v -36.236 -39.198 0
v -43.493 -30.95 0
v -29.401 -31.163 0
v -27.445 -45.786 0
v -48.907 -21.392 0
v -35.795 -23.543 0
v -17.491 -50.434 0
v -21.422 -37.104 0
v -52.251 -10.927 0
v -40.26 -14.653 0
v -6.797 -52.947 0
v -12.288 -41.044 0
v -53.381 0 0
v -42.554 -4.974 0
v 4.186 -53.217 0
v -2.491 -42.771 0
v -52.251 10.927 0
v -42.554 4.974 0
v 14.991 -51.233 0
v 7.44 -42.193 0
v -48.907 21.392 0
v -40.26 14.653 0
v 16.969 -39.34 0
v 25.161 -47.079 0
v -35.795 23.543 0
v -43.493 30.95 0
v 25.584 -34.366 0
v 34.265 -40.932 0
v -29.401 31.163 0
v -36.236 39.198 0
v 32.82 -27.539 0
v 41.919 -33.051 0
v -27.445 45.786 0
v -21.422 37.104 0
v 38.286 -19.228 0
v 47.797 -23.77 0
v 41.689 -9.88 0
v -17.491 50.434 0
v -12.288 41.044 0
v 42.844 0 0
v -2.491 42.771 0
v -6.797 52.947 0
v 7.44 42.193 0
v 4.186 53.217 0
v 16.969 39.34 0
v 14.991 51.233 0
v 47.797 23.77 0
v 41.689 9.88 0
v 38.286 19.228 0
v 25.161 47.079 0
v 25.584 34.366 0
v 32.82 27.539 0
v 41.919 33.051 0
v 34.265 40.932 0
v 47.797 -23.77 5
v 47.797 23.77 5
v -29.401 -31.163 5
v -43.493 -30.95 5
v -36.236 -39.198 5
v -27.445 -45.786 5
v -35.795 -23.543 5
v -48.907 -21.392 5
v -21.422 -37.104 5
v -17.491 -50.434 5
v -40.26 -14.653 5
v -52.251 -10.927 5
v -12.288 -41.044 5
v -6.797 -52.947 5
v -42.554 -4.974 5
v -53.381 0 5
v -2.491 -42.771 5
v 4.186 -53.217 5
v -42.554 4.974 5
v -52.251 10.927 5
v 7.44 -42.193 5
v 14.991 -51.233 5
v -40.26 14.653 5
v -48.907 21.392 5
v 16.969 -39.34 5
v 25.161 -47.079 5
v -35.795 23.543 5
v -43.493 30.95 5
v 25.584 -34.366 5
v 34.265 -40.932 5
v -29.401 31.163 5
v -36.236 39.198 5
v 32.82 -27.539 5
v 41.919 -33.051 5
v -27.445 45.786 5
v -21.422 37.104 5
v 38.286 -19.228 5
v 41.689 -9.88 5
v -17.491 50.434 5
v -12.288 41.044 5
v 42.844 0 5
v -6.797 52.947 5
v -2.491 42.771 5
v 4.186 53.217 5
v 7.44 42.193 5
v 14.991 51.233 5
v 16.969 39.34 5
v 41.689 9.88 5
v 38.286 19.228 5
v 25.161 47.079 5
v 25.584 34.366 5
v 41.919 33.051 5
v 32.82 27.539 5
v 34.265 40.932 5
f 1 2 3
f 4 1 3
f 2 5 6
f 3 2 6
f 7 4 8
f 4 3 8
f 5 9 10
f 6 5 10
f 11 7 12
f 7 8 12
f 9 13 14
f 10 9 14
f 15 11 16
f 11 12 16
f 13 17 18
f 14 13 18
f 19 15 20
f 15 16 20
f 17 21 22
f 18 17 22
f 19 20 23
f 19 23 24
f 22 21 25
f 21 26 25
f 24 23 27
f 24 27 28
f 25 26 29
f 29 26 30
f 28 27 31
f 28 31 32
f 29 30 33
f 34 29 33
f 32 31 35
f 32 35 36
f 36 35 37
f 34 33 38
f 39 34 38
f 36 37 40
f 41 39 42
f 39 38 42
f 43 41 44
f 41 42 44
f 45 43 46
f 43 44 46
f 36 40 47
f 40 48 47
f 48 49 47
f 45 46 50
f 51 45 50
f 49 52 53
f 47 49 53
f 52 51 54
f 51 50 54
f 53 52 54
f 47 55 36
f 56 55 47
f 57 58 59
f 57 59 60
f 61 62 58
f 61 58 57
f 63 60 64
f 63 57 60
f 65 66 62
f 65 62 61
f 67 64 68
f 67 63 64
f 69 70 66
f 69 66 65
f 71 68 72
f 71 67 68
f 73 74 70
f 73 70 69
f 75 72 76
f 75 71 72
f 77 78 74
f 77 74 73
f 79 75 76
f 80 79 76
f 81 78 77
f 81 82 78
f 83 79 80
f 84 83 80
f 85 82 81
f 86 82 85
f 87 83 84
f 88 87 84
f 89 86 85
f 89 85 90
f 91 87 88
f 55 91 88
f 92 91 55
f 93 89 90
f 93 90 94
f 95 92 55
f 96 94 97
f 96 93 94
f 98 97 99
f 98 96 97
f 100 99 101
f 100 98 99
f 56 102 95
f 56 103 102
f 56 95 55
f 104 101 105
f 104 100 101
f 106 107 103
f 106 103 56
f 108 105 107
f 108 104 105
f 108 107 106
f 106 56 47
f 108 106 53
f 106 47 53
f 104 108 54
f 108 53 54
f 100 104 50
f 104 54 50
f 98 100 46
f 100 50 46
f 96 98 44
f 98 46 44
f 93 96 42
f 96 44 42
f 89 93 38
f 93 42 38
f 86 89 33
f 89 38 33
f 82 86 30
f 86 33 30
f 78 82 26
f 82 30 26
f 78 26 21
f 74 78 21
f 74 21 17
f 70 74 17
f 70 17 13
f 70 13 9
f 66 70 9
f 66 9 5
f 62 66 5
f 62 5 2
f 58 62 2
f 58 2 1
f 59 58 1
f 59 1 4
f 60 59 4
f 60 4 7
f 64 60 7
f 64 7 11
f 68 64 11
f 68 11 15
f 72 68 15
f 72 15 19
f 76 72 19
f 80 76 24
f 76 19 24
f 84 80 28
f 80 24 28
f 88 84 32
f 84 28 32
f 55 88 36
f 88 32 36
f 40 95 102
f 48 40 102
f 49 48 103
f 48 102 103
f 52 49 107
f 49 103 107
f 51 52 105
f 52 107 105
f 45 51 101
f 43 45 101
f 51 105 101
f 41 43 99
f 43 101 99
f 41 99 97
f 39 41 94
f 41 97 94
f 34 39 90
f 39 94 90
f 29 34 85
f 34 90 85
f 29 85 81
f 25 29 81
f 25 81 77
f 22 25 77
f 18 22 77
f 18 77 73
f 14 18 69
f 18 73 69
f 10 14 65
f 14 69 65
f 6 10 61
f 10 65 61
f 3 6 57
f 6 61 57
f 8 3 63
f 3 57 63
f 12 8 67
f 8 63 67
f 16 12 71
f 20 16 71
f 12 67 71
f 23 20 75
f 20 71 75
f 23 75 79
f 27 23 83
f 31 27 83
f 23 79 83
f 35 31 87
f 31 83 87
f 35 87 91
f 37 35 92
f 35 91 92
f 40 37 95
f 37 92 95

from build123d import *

# Parameters (mm, degrees)
F0_R      = 53.381002
F1_DEPTH  = 5
F2_R      = 42.843554
F3_DEPTH  = 5
F4_W      = 10.931604
F4_H      = 106.757529
F5_DEPTH  = 25.4
F5_FACE_W = 10.931604
F5_FACE_H = 106.75753
F6_DEPTH  = 25.4


with BuildPart() as f1:
    # F0 (on Top) → F1 (new body)
    with BuildSketch(Plane.XY):
        Circle(F0_R)
    extrude(amount=F1_DEPTH)

    # F2 (on face) → F3 (cut)
    with BuildSketch(Plane.XY.offset(5)):
        Circle(F2_R)
    extrude(amount=-F3_DEPTH, mode=Mode.SUBTRACT)

    # F4 (on Top) → F5 (join)
    with BuildSketch(Plane.XY):
        with Locations((53.262476, 0.232588)):
            Rectangle(F4_W, F4_H)
    extrude(amount=F5_DEPTH)

    # F5_face (on face) → F6 (cut)
    with BuildSketch(Plane(origin=(53.262476, 0.232588, 25.4), x_dir=(1, 0, 0), z_dir=(0, 0, 1))):
        Rectangle(F5_FACE_W, F5_FACE_H)
    extrude(amount=-F6_DEPTH, mode=Mode.SUBTRACT)


solid = f1.part
